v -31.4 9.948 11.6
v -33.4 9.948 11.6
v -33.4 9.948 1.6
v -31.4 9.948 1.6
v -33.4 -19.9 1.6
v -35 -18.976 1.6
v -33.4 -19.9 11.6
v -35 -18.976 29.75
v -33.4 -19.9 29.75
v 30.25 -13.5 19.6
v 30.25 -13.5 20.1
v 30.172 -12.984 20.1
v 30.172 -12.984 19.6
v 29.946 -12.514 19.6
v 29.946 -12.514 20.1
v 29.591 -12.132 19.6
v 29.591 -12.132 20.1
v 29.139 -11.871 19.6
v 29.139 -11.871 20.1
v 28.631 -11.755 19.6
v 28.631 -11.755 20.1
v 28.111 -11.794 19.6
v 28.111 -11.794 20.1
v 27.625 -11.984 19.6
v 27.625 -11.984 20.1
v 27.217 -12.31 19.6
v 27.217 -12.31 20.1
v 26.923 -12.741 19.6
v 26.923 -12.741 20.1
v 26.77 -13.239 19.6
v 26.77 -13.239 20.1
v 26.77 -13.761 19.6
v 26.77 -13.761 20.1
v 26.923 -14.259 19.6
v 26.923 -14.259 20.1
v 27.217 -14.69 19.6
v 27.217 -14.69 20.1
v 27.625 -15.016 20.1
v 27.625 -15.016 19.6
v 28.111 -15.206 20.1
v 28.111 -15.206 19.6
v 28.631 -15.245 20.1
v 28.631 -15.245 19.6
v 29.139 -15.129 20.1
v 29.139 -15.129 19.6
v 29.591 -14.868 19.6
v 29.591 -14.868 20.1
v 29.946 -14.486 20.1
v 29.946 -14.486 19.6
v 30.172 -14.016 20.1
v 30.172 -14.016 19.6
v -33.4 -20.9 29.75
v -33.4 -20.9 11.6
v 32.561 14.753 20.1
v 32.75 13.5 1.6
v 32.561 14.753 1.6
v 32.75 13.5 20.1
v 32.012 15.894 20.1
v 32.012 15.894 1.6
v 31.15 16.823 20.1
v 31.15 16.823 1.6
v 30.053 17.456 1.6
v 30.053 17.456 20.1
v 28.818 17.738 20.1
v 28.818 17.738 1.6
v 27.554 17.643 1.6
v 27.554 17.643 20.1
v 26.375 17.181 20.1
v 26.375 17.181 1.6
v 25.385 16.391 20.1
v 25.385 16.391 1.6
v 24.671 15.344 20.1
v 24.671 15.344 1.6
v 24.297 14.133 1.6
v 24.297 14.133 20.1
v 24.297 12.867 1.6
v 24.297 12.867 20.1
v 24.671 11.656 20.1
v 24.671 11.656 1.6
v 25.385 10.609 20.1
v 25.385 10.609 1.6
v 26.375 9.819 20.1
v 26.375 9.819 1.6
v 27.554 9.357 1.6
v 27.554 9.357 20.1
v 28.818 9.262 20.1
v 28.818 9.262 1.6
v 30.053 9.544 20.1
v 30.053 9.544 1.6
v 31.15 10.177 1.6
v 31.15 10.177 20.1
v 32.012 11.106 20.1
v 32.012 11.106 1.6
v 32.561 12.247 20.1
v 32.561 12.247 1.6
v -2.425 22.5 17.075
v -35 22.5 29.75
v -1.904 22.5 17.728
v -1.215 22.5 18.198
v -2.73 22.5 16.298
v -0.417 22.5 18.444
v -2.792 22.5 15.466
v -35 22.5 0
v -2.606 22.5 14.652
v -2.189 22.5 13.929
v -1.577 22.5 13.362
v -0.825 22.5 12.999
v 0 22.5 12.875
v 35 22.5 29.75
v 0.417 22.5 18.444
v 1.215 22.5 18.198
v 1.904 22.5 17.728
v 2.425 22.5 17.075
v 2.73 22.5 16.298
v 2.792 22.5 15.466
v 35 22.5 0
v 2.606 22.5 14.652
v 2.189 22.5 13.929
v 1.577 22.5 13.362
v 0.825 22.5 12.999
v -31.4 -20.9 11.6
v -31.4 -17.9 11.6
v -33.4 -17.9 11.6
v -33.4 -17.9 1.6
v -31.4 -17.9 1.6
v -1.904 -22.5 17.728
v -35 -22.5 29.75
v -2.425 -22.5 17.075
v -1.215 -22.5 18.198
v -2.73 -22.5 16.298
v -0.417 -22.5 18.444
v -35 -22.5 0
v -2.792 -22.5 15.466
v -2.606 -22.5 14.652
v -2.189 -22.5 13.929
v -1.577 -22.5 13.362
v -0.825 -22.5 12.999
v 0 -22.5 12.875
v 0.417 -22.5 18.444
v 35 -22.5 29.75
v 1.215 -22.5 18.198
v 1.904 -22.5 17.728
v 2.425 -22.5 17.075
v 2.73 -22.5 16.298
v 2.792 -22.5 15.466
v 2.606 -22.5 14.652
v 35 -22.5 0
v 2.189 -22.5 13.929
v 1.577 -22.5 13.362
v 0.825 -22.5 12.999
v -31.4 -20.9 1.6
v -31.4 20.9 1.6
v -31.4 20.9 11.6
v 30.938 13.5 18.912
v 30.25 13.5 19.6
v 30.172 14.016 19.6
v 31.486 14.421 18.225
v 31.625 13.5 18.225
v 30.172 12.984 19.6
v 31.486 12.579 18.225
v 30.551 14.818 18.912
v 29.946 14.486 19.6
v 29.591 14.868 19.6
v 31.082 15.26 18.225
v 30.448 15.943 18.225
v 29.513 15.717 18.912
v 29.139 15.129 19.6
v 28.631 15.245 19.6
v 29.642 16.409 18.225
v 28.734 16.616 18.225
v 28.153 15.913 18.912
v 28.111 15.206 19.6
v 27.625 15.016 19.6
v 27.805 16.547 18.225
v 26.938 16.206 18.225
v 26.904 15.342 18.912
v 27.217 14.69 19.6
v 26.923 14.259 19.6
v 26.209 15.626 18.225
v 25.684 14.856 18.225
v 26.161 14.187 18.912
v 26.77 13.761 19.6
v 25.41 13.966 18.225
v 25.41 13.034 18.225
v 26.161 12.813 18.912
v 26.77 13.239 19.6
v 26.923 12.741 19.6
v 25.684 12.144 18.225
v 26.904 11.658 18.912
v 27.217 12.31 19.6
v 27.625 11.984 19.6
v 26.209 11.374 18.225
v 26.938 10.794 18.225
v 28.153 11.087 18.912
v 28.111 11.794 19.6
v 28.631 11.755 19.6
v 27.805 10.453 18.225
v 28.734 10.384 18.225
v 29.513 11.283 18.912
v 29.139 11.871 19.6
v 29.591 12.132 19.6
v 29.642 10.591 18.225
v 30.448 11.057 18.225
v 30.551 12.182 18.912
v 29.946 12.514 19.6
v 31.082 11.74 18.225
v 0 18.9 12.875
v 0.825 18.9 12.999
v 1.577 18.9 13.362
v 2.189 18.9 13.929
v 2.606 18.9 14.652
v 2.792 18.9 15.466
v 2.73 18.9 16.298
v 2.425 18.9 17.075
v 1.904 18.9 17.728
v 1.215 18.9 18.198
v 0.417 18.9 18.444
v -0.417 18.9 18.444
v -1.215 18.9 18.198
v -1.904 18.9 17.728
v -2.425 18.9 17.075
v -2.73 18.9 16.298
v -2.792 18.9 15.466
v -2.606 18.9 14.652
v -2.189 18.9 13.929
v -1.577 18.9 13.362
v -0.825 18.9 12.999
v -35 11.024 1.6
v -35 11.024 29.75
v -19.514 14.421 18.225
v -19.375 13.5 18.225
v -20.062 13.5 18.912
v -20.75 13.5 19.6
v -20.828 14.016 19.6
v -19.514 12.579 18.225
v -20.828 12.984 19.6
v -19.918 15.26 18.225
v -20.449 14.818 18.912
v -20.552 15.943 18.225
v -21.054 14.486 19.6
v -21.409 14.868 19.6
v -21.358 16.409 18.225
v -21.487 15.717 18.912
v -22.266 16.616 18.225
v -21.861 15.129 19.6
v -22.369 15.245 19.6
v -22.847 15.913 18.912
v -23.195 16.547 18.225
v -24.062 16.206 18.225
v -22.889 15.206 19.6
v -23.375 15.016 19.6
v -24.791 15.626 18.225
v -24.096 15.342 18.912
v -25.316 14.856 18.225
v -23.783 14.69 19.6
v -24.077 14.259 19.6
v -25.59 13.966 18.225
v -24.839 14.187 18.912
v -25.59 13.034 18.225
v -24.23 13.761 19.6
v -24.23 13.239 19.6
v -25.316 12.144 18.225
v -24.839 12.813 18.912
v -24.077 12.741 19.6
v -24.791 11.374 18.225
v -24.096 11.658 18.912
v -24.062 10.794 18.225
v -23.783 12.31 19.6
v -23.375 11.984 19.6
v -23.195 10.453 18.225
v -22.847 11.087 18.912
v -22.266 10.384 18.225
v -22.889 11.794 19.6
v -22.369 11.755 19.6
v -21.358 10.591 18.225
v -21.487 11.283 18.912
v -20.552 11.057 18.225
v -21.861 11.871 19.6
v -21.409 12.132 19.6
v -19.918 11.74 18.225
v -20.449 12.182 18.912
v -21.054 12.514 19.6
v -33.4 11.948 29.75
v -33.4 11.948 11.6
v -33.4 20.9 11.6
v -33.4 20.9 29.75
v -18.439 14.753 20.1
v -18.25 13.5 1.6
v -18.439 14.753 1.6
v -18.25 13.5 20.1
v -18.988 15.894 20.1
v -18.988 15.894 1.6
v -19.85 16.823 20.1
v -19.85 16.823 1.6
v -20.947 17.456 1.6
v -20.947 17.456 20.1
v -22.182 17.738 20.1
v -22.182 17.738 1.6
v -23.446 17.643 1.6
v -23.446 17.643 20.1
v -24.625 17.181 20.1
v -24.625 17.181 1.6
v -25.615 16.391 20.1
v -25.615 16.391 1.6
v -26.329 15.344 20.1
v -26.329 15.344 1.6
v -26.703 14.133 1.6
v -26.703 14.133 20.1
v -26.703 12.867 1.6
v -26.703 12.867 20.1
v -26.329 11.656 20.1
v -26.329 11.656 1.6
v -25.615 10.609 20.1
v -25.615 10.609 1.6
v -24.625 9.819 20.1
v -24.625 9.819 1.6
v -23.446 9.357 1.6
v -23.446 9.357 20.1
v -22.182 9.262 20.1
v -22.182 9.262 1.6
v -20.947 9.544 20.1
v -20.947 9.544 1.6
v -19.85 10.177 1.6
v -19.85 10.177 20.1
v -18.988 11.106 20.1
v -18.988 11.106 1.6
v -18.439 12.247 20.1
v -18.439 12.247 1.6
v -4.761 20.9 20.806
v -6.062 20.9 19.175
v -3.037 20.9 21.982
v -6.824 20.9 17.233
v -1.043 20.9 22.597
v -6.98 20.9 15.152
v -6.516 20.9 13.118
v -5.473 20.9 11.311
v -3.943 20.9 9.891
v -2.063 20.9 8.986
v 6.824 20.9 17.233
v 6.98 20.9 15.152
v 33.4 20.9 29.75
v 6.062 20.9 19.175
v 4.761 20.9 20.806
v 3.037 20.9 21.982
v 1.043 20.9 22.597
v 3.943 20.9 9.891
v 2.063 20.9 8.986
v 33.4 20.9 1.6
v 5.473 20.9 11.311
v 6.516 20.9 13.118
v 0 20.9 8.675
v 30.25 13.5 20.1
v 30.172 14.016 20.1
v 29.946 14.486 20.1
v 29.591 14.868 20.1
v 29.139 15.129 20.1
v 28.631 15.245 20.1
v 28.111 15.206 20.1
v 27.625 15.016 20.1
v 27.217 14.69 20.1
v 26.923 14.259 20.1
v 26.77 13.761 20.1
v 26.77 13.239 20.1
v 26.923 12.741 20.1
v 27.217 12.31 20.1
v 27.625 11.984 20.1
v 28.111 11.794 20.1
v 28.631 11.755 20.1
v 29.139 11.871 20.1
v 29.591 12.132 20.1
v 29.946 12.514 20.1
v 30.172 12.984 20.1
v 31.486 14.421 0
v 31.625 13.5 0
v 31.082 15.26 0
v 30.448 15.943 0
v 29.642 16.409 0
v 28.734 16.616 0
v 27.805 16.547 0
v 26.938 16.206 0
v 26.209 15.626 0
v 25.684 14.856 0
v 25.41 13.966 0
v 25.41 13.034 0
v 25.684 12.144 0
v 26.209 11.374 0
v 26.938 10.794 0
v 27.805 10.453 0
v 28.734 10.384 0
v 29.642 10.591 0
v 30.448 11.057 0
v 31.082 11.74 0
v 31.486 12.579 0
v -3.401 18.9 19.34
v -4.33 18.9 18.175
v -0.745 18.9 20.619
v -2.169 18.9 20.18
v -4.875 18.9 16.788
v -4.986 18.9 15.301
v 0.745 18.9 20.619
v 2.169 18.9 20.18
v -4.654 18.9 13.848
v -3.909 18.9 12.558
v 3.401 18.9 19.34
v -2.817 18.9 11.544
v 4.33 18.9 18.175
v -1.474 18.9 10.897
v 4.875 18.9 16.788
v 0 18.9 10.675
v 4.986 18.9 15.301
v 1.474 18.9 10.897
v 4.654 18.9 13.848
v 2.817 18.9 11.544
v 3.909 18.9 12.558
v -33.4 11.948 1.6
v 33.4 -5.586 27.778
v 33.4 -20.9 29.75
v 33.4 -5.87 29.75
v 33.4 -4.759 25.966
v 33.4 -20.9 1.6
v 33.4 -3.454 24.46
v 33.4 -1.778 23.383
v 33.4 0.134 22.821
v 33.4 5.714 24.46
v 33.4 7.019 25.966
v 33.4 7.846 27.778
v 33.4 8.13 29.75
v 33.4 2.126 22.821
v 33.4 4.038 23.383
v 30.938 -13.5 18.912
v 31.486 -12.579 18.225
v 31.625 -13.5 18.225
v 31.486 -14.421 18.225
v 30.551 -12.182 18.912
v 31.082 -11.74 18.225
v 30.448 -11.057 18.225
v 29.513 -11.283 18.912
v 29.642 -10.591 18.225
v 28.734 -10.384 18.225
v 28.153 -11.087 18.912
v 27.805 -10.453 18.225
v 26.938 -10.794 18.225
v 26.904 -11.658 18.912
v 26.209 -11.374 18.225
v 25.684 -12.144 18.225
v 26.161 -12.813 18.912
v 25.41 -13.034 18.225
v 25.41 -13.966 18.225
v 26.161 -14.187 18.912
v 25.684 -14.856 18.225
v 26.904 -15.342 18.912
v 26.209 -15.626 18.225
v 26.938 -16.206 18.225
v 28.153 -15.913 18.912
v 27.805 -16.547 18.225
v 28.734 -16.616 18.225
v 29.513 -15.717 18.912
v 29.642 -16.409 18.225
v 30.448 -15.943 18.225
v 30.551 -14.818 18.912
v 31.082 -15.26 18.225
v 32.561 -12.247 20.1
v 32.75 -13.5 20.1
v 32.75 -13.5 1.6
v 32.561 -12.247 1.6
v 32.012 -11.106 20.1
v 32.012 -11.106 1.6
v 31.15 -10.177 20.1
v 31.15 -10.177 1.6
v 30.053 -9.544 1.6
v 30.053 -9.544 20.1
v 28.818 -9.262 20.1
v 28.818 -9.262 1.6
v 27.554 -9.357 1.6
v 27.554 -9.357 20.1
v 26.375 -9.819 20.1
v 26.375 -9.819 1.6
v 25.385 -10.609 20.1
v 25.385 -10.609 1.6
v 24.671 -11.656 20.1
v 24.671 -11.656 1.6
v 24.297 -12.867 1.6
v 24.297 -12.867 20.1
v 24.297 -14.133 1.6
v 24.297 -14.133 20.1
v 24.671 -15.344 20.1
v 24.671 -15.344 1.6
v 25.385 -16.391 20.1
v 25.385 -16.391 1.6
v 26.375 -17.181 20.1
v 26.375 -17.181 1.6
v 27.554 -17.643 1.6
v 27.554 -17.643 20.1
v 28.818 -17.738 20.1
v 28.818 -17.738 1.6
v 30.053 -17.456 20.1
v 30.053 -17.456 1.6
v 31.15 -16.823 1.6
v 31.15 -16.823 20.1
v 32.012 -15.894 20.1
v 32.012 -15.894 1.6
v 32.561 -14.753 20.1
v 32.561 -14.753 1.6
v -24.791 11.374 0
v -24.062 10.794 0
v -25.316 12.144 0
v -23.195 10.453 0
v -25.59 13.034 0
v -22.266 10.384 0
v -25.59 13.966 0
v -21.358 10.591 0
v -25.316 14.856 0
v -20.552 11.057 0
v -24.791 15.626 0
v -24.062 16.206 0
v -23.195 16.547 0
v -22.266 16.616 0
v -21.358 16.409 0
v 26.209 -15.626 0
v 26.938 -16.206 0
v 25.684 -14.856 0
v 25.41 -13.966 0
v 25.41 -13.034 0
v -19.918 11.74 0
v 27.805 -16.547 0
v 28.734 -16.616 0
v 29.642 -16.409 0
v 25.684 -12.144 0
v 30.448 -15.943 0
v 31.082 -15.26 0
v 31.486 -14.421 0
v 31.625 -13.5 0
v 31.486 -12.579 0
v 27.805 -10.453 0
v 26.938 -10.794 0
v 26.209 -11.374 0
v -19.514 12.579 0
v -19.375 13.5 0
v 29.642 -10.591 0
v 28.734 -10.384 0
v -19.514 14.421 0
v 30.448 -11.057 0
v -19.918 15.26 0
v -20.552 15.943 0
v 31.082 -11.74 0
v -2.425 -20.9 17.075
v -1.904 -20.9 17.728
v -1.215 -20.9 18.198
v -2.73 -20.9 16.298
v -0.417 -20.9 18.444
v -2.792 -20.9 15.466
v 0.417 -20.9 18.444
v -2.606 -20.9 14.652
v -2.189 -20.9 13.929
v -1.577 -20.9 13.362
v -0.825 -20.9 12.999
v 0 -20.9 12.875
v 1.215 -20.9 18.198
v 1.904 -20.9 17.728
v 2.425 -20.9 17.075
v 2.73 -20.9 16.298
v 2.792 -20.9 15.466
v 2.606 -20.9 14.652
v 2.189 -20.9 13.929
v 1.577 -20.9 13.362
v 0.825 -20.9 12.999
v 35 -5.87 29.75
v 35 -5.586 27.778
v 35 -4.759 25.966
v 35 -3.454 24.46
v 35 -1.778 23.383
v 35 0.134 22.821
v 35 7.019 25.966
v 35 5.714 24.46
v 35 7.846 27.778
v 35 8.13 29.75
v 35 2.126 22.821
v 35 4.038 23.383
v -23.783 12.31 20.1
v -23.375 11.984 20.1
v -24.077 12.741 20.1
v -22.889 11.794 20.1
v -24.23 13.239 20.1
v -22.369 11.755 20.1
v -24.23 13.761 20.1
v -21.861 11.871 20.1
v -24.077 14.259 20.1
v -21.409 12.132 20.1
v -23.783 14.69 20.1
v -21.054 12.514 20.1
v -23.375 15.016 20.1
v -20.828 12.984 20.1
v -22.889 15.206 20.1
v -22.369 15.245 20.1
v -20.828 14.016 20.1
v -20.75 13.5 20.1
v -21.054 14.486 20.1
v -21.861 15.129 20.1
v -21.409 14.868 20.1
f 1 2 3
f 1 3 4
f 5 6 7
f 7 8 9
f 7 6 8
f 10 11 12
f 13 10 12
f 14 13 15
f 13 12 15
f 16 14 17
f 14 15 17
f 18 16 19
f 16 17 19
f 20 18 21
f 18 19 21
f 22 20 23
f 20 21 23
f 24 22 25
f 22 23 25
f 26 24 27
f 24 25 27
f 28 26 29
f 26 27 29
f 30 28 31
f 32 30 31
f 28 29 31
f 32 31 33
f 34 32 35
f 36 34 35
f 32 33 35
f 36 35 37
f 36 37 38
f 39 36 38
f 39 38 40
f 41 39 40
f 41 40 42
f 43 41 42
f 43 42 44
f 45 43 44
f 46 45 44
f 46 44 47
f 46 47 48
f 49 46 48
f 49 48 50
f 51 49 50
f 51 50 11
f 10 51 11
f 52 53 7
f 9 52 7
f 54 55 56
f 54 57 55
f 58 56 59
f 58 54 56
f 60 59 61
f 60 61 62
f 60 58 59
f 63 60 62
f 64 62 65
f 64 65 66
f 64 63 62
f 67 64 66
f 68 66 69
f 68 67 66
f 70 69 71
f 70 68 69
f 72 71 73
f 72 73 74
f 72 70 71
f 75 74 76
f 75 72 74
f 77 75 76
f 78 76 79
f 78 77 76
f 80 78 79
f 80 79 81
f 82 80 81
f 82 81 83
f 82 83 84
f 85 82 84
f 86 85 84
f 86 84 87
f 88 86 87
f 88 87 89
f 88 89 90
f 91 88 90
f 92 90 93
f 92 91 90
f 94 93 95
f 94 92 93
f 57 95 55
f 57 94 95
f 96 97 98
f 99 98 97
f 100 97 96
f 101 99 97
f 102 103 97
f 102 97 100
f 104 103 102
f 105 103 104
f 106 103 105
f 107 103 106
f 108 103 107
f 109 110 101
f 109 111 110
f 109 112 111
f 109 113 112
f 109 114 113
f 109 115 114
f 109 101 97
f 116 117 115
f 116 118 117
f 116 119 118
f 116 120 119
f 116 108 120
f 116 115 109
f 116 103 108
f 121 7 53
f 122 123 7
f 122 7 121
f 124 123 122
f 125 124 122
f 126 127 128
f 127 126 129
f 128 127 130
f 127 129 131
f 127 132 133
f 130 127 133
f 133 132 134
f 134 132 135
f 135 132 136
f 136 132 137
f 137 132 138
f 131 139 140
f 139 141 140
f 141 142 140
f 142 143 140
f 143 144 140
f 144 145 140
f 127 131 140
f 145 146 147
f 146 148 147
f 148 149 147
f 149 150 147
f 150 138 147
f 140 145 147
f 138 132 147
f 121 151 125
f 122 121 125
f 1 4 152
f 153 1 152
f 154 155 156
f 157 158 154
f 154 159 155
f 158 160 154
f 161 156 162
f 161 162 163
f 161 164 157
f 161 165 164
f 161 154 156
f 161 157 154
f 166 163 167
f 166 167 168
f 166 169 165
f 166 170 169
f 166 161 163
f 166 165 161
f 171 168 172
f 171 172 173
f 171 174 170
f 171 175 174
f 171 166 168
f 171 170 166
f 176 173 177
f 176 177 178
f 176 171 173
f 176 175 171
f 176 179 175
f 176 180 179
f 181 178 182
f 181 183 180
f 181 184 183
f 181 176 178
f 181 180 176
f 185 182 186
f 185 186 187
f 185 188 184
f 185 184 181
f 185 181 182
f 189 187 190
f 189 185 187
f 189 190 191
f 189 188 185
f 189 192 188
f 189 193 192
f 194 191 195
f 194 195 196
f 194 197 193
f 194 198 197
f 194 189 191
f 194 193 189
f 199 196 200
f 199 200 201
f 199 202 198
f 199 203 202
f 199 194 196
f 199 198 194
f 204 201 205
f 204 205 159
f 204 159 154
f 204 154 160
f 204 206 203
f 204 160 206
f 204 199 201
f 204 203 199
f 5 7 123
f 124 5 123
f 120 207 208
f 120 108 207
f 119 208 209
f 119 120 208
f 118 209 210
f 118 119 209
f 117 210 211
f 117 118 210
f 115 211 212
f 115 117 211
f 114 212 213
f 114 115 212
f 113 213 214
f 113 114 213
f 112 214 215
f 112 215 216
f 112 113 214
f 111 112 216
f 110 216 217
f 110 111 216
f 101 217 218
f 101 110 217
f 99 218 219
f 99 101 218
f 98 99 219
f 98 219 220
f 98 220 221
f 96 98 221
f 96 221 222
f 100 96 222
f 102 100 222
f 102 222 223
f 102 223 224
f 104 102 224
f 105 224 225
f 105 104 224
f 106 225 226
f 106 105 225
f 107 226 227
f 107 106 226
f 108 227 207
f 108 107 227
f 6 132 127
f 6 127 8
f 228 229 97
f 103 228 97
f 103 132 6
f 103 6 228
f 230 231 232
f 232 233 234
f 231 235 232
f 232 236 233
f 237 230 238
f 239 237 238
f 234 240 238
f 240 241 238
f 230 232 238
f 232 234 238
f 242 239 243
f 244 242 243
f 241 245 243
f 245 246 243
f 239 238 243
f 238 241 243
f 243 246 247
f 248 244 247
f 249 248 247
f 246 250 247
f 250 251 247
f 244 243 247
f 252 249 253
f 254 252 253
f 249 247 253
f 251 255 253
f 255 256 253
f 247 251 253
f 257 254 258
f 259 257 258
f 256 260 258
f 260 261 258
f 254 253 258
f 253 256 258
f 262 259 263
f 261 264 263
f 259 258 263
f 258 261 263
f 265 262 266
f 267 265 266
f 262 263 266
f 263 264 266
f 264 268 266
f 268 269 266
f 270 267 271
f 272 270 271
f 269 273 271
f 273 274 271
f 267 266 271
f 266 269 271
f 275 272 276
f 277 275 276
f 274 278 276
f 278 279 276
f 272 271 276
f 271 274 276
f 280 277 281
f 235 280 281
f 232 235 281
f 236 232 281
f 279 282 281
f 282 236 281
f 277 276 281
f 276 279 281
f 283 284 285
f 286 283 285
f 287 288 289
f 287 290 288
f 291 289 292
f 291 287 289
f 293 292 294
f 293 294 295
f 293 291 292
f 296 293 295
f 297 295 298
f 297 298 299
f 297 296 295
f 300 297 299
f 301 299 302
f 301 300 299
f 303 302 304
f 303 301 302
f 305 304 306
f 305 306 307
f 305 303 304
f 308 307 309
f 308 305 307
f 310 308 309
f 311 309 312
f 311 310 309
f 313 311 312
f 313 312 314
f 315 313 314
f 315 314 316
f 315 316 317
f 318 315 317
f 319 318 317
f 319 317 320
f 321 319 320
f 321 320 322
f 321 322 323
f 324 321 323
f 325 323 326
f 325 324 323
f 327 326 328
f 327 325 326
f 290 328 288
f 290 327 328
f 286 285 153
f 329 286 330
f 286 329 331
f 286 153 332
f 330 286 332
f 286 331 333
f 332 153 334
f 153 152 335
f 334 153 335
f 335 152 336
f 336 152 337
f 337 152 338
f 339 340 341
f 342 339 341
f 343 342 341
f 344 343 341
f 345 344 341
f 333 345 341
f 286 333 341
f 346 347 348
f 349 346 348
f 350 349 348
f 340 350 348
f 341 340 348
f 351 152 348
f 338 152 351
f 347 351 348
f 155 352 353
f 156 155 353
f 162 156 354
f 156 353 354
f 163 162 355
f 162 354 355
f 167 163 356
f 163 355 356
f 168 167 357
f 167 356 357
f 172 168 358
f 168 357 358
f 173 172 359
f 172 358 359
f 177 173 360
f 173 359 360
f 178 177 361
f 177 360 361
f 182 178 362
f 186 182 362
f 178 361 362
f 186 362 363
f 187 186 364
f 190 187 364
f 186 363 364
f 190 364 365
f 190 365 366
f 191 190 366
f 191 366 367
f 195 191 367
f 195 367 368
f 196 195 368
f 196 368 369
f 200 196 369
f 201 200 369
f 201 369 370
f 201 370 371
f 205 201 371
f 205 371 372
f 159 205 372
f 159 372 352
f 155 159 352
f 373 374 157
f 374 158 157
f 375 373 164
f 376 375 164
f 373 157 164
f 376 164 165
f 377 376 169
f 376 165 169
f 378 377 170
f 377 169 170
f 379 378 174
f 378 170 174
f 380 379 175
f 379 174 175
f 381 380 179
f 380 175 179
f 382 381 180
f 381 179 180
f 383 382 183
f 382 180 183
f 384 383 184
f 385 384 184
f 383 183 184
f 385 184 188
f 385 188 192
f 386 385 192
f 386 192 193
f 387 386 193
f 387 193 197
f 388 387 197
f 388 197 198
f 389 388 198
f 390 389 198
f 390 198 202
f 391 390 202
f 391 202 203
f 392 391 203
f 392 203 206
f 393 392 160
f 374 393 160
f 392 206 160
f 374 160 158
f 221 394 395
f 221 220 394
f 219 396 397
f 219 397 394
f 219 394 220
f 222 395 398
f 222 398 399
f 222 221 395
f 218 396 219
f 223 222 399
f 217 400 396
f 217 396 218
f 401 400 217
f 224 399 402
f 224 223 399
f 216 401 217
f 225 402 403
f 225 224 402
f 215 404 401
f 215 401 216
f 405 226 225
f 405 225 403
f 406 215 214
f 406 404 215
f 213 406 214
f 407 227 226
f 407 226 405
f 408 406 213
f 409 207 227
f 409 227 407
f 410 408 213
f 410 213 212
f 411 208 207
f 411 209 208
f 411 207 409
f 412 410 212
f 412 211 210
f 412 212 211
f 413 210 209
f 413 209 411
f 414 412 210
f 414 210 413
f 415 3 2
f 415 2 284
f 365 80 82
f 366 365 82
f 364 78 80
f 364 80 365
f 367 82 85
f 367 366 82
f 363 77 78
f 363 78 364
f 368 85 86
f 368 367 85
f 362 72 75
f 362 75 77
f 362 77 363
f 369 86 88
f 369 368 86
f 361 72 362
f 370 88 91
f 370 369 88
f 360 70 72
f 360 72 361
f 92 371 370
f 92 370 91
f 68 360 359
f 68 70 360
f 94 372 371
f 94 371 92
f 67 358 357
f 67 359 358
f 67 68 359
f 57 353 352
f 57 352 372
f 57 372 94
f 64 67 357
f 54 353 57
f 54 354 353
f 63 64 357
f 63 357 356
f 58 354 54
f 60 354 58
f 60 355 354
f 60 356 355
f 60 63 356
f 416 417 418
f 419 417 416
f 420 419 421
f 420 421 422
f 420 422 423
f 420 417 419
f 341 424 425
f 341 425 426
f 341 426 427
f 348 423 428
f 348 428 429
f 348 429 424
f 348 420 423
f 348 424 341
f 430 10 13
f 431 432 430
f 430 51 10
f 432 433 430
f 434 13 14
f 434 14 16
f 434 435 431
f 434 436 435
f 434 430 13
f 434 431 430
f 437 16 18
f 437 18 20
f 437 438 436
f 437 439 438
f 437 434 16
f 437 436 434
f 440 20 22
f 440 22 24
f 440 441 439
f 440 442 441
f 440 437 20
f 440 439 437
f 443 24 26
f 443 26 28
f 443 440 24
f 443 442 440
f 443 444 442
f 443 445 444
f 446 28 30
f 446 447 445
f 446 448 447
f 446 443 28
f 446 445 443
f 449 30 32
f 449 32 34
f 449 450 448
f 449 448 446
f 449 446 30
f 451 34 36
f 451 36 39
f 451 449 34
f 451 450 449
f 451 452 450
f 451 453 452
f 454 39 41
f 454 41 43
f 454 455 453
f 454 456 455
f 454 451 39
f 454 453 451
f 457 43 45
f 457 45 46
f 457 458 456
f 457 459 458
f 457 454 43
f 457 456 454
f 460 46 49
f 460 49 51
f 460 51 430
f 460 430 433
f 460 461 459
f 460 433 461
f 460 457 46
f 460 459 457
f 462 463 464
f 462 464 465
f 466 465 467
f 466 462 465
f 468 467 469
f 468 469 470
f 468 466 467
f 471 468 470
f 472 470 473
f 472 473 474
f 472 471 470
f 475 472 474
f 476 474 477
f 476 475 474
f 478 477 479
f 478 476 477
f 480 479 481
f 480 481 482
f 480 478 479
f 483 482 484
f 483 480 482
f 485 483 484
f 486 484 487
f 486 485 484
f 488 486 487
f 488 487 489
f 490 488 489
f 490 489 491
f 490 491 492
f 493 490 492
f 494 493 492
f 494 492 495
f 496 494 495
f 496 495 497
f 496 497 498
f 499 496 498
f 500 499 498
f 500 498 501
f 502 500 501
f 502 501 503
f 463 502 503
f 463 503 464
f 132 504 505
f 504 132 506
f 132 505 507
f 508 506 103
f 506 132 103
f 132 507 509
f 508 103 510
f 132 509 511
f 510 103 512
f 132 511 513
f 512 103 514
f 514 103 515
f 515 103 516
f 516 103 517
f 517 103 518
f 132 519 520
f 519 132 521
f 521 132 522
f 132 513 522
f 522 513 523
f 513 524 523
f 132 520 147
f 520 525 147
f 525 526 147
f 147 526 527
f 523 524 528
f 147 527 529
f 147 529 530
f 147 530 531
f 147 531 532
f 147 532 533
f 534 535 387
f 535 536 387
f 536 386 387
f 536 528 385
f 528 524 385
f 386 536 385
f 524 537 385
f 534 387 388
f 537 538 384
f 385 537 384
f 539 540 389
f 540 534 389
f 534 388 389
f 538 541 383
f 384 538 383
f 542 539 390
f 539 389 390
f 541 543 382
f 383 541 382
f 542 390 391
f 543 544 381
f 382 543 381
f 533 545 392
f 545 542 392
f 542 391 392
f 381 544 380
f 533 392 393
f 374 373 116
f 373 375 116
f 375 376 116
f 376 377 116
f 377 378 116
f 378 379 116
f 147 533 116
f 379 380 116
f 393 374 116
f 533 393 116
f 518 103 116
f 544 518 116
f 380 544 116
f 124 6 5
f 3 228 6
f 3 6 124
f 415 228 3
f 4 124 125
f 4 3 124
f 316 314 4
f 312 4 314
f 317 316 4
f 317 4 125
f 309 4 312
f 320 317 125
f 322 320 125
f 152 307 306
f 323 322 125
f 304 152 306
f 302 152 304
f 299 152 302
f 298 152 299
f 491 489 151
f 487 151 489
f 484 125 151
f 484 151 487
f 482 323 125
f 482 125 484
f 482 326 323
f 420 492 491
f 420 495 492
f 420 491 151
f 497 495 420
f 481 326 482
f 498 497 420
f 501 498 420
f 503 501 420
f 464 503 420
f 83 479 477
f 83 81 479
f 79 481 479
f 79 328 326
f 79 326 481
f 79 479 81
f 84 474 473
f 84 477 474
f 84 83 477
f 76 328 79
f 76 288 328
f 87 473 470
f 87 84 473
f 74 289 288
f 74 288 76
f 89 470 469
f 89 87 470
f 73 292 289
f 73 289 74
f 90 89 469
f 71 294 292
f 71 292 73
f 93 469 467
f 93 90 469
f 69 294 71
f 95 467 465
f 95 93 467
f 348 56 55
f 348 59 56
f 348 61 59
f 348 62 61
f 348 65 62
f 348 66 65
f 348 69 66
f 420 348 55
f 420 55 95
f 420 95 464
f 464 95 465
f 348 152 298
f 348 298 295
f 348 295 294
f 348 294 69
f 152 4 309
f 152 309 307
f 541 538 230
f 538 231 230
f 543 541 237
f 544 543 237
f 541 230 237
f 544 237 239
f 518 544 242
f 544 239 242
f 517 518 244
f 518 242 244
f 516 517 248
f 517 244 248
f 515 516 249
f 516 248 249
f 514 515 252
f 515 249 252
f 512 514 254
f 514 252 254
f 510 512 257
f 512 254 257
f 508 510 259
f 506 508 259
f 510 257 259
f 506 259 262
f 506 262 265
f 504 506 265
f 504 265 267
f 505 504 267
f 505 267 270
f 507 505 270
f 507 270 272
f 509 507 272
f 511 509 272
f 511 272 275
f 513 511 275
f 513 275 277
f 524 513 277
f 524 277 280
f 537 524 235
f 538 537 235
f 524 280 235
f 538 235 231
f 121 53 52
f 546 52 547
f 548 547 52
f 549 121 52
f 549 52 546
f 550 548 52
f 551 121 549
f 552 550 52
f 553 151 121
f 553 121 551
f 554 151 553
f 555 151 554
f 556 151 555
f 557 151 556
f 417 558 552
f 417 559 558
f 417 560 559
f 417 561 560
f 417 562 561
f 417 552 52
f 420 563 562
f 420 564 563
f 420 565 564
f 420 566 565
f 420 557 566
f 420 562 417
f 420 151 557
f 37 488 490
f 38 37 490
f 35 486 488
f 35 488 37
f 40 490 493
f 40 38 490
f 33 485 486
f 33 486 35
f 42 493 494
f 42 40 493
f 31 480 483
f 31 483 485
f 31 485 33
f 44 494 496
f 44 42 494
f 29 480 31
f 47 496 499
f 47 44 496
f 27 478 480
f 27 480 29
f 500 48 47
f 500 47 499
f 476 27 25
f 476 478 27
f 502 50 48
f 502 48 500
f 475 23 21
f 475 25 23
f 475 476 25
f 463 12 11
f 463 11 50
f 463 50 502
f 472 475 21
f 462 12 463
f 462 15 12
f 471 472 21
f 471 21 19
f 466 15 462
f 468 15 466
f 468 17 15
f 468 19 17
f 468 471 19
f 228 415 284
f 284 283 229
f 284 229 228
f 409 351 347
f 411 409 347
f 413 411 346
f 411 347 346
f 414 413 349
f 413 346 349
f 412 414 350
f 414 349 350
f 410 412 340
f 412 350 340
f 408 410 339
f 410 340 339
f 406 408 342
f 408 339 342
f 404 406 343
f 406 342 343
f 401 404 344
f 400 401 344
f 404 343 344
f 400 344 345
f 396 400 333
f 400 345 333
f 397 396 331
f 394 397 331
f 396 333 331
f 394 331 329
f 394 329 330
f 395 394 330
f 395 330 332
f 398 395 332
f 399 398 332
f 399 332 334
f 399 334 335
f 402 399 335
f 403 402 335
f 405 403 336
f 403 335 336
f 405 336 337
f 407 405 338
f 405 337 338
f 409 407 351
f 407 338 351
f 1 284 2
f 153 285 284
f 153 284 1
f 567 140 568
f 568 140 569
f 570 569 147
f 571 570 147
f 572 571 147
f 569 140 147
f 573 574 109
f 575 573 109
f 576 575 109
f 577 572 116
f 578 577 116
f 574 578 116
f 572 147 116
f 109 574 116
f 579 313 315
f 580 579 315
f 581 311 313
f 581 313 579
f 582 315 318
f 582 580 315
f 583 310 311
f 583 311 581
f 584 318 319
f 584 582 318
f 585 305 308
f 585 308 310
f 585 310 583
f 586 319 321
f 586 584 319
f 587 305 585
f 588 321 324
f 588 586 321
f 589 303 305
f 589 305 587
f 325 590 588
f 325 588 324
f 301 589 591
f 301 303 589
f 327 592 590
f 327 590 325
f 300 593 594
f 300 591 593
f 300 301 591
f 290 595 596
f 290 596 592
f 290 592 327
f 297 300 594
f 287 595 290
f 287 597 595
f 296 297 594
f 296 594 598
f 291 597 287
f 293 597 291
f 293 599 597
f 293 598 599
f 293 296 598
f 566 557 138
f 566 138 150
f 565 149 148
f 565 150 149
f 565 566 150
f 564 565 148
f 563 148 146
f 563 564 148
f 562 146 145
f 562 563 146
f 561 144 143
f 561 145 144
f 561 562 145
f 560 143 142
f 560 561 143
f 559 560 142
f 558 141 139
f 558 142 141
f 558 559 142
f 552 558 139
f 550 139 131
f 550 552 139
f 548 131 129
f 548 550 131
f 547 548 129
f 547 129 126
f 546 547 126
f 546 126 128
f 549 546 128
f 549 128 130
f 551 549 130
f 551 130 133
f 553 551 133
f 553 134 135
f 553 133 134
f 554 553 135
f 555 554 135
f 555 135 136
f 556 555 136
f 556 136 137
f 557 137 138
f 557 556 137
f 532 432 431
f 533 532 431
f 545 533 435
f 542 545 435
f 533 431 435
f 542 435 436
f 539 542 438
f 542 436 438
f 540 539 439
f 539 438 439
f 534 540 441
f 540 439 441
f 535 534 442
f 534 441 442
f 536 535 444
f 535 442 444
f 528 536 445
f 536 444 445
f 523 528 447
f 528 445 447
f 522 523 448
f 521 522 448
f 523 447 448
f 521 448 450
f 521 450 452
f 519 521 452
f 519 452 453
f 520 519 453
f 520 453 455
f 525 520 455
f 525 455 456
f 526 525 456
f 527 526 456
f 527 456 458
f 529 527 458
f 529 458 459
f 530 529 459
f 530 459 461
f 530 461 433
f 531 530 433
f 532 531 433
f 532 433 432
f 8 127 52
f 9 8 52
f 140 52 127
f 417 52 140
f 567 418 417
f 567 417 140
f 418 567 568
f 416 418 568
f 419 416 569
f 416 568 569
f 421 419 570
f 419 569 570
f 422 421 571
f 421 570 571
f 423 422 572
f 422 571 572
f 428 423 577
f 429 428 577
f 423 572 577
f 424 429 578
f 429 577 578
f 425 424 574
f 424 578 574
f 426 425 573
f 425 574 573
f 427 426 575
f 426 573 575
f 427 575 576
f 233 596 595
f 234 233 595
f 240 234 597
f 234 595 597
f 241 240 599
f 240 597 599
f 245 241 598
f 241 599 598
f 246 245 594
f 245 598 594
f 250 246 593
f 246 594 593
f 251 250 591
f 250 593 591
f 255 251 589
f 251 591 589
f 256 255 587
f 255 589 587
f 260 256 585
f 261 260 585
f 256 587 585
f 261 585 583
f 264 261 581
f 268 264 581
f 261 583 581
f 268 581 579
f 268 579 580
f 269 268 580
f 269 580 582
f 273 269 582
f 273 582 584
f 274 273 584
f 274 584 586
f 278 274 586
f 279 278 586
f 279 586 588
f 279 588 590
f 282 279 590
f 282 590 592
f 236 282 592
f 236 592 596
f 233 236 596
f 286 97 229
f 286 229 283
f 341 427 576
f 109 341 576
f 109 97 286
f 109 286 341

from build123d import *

# Parameters (mm, degrees)
SKETCH2_W               = 70
SKETCH2_H               = 45
BOSS_EXTRUDE1_DEPTH     = 1.6
SKETCH3_R               = 3.125
CUT_EXTRUDE1_DEPTH      = 1.6
SKETCH4_W               = 70
SKETCH4_H               = 45
SKETCH4_W_2             = 66.8
SKETCH4_H_2             = 41.8
BOSS_EXTRUDE2_DEPTH     = 28.15
BOSS_EXTRUDE3_START     = 16.5
SKETCH5_R               = 4.25
SKETCH5_R_2             = 3.125
BOSS_EXTRUDE3_DEPTH     = 16.5
BOSS_EXTRUDE4_START     = 2
SKETCH6_R               = 4.25
SKETCH6_R_2             = 1.75
BOSS_EXTRUDE4_DEPTH     = 2
CHAMFER1_SIZE           = 1.5
SKETCH7_R               = 7
CUT_EXTRUDE2_DEPTH      = 10
CUT_EXTRUDE3_DEPTH      = 28.15
CUT_EXTRUDE4_DEPTH      = 64.195114526
CUT_EXTRUDE4_DEPTH_BACK = 64.195114526
SKETCH9_R               = 2.8
SKETCH10_R              = 5
SKETCH10_R_2            = 2.8
BOSS_EXTRUDE5_DEPTH     = 2
CHAMFER2_SIZE           = 2
SKETCH11_W              = 2
SKETCH11_H              = 3
SKETCH11_H_2            = 10.952479139
BOSS_EXTRUDE6_DEPTH     = 10


# Some blends are built 0.0001 mm under size
with BuildPart() as part:
    # Sketch2 → Boss-Extrude1 (new body)
    with BuildSketch(Plane.XY):
        Rectangle(SKETCH2_W, SKETCH2_H)
    extrude(amount=BOSS_EXTRUDE1_DEPTH)

    # Sketch3 → Cut-Extrude1 (cut)
    with BuildSketch(Plane.XY.offset(1.6)):
        with Locations((-22.5, 13.5)):
            Circle(SKETCH3_R)
        with Locations((28.5, 13.5)):
            Circle(SKETCH3_R)
        with Locations((28.5, -13.5)):
            Circle(SKETCH3_R)
    extrude(amount=-CUT_EXTRUDE1_DEPTH, mode=Mode.SUBTRACT)

    # Sketch4 → Boss-Extrude2 (add)
    with BuildSketch(Plane.XY.offset(1.6)):
        Rectangle(SKETCH4_W, SKETCH4_H)
        Rectangle(SKETCH4_W_2, SKETCH4_H_2, mode=Mode.SUBTRACT)
    extrude(amount=BOSS_EXTRUDE2_DEPTH)

    # Sketch5 → Boss-Extrude3 (add)
    # profile 1 of 3: a face of its own
    with BuildSketch(Plane.XY.offset(1.6).offset(BOSS_EXTRUDE3_START)):
        with Locations((-22.5, 13.5)):
            Circle(SKETCH5_R)
        with Locations((-22.5, 13.5)):
            Circle(SKETCH5_R_2, mode=Mode.SUBTRACT)
    # profile 2 of 3: a face of its own
    with BuildSketch(Plane.XY.offset(1.6).offset(BOSS_EXTRUDE3_START)):
        with Locations((28.5, 13.5)):
            Circle(SKETCH5_R)
        with Locations((28.5, 13.5)):
            Circle(SKETCH5_R_2, mode=Mode.SUBTRACT)
    # profile 3 of 3: a face of its own
    with BuildSketch(Plane.XY.offset(1.6).offset(BOSS_EXTRUDE3_START)):
        with Locations((28.5, -13.5)):
            Circle(SKETCH5_R)
        with Locations((28.5, -13.5)):
            Circle(SKETCH5_R_2, mode=Mode.SUBTRACT)
    extrude(amount=-BOSS_EXTRUDE3_DEPTH)

    # Sketch6 → Boss-Extrude4 (add)
    # profile 1 of 3: a face of its own
    with BuildSketch(Plane.XY.offset(18.1).offset(BOSS_EXTRUDE4_START)):
        with Locations((28.5, -13.5)):
            Circle(SKETCH6_R)
        with Locations((28.5, -13.5)):
            Circle(SKETCH6_R_2, mode=Mode.SUBTRACT)
    # profile 2 of 3: a face of its own
    with BuildSketch(Plane.XY.offset(18.1).offset(BOSS_EXTRUDE4_START)):
        with Locations((28.5, 13.5)):
            Circle(SKETCH6_R)
        with Locations((28.5, 13.5)):
            Circle(SKETCH6_R_2, mode=Mode.SUBTRACT)
    # profile 3 of 3: a face of its own
    with BuildSketch(Plane.XY.offset(18.1).offset(BOSS_EXTRUDE4_START)):
        with Locations((-22.5, 13.5)):
            Circle(SKETCH6_R)
        with Locations((-22.5, 13.5)):
            Circle(SKETCH6_R_2, mode=Mode.SUBTRACT)
    extrude(amount=-BOSS_EXTRUDE4_DEPTH)

    # Chamfer1
    # the kernel refuses this chamfer: 1.5 mm, written as the material it takes off along each edge
    with BuildSketch(Plane(origin=(28.5, 13.5, 18.1), x_dir=(1, 0, 0), z_dir=(0, -1, 0))) as chamfer1_piece_1_section:
        Polygon((1.75, CHAMFER1_SIZE), (1.75 + CHAMFER1_SIZE, 0), (1.75, 0), align=None)
    chamfer1_piece_1 = revolve(axis=Axis((28.5, 13.5, 18.1), (0, 0, 1)), mode=Mode.PRIVATE)
    chamfer1_piece_1 = chamfer1_piece_1 & Plane(origin=(28.5, 13.5, 18.915495492), x_dir=(1, 0, 0), z_dir=(0, 0, 1)) * Cylinder(3.125, 13, mode=Mode.PRIVATE)
    add(chamfer1_piece_1, mode=Mode.SUBTRACT)
    with BuildSketch(Plane(origin=(28.5, -13.5, 18.1), x_dir=(1, 0, 0), z_dir=(0, -1, 0))) as chamfer1_piece_2_section:
        Polygon((1.75, CHAMFER1_SIZE), (1.75 + CHAMFER1_SIZE, 0), (1.75, 0), align=None)
    chamfer1_piece_2 = revolve(axis=Axis((28.5, -13.5, 18.1), (0, 0, 1)), mode=Mode.PRIVATE)
    chamfer1_piece_2 = chamfer1_piece_2 & Plane(origin=(28.5, -13.5, 18.915495492), x_dir=(1, 0, 0), z_dir=(0, 0, 1)) * Cylinder(3.125, 13, mode=Mode.PRIVATE)
    add(chamfer1_piece_2, mode=Mode.SUBTRACT)
    with BuildSketch(Plane(origin=(-22.5, 13.5, 18.1), x_dir=(1, 0, 0), z_dir=(0, -1, 0))) as chamfer1_piece_3_section:
        Polygon((1.75 + CHAMFER1_SIZE, 0), (1.75, CHAMFER1_SIZE), (1.75, 0), align=None)
    chamfer1_piece_3 = revolve(axis=Axis((-22.5, 13.5, 18.1), (0, 0, 1)), mode=Mode.PRIVATE)
    chamfer1_piece_3 = chamfer1_piece_3 & Plane(origin=(-22.5, 13.5, 18.915495492), x_dir=(1, 0, 0), z_dir=(0, 0, 1)) * Cylinder(3.125, 13, mode=Mode.PRIVATE)
    add(chamfer1_piece_3, mode=Mode.SUBTRACT)

    # Sketch7 → Cut-Extrude2 (cut)
    with BuildSketch(Plane(origin=(35, 0, 0), x_dir=(0, 0, -1), z_dir=(1, 0, 0))):
        with Locations((-29.75, 1.13)):
            Circle(SKETCH7_R)
    extrude(amount=-CUT_EXTRUDE2_DEPTH, mode=Mode.SUBTRACT)

    # Sketch8 → Cut-Extrude3 (cut)
    with BuildSketch(Plane.XY.offset(29.75)):
        Polygon((-35, -18.976239569), (-33.4, -19.9), (-33.4, 11.947520861), (-35, 11.023760431), align=None)
    extrude(amount=-CUT_EXTRUDE3_DEPTH, mode=Mode.SUBTRACT)

    # Sketch9 → Cut-Extrude4 (cut, two sides: drawn at the far end of the back side and taken through both)
    with BuildSketch(Plane.XZ.offset(-20.9).offset(-CUT_EXTRUDE4_DEPTH_BACK)):
        with Locations(Location((0, 15.675, 0), (0, 0, 270))):
            Circle(SKETCH9_R)
    extrude(amount=CUT_EXTRUDE4_DEPTH + CUT_EXTRUDE4_DEPTH_BACK, mode=Mode.SUBTRACT)

    # Sketch10 → Boss-Extrude5 (add)
    with BuildSketch(Plane.XZ.offset(-20.9)):
        with Locations(Location((0, 15.675, 0), (0, 0, 270))):
            Circle(SKETCH10_R)
        with Locations(Location((0, 15.675, 0), (0, 0, 270))):
            Circle(SKETCH10_R_2, mode=Mode.SUBTRACT)
    extrude(amount=BOSS_EXTRUDE5_DEPTH)

    # Chamfer2
    chamfer2_edges = [part.edges().sort_by_distance(p)[0] for p in [
        (0, 20.9, 20.675),
    ]]
    chamfer(chamfer2_edges, length=CHAMFER2_SIZE - 0.0001)  # a hair under: the kernel refuses the full size

    # Sketch11 → Boss-Extrude6 (add)
    with BuildSketch(Plane.XY.offset(1.6)):
        with Locations((-32.4, -19.4)):
            Rectangle(SKETCH11_W, SKETCH11_H)
        with Locations((-32.4, 15.423760431)):
            Rectangle(SKETCH11_W, SKETCH11_H_2)
    extrude(amount=BOSS_EXTRUDE6_DEPTH)


solid = part.part
